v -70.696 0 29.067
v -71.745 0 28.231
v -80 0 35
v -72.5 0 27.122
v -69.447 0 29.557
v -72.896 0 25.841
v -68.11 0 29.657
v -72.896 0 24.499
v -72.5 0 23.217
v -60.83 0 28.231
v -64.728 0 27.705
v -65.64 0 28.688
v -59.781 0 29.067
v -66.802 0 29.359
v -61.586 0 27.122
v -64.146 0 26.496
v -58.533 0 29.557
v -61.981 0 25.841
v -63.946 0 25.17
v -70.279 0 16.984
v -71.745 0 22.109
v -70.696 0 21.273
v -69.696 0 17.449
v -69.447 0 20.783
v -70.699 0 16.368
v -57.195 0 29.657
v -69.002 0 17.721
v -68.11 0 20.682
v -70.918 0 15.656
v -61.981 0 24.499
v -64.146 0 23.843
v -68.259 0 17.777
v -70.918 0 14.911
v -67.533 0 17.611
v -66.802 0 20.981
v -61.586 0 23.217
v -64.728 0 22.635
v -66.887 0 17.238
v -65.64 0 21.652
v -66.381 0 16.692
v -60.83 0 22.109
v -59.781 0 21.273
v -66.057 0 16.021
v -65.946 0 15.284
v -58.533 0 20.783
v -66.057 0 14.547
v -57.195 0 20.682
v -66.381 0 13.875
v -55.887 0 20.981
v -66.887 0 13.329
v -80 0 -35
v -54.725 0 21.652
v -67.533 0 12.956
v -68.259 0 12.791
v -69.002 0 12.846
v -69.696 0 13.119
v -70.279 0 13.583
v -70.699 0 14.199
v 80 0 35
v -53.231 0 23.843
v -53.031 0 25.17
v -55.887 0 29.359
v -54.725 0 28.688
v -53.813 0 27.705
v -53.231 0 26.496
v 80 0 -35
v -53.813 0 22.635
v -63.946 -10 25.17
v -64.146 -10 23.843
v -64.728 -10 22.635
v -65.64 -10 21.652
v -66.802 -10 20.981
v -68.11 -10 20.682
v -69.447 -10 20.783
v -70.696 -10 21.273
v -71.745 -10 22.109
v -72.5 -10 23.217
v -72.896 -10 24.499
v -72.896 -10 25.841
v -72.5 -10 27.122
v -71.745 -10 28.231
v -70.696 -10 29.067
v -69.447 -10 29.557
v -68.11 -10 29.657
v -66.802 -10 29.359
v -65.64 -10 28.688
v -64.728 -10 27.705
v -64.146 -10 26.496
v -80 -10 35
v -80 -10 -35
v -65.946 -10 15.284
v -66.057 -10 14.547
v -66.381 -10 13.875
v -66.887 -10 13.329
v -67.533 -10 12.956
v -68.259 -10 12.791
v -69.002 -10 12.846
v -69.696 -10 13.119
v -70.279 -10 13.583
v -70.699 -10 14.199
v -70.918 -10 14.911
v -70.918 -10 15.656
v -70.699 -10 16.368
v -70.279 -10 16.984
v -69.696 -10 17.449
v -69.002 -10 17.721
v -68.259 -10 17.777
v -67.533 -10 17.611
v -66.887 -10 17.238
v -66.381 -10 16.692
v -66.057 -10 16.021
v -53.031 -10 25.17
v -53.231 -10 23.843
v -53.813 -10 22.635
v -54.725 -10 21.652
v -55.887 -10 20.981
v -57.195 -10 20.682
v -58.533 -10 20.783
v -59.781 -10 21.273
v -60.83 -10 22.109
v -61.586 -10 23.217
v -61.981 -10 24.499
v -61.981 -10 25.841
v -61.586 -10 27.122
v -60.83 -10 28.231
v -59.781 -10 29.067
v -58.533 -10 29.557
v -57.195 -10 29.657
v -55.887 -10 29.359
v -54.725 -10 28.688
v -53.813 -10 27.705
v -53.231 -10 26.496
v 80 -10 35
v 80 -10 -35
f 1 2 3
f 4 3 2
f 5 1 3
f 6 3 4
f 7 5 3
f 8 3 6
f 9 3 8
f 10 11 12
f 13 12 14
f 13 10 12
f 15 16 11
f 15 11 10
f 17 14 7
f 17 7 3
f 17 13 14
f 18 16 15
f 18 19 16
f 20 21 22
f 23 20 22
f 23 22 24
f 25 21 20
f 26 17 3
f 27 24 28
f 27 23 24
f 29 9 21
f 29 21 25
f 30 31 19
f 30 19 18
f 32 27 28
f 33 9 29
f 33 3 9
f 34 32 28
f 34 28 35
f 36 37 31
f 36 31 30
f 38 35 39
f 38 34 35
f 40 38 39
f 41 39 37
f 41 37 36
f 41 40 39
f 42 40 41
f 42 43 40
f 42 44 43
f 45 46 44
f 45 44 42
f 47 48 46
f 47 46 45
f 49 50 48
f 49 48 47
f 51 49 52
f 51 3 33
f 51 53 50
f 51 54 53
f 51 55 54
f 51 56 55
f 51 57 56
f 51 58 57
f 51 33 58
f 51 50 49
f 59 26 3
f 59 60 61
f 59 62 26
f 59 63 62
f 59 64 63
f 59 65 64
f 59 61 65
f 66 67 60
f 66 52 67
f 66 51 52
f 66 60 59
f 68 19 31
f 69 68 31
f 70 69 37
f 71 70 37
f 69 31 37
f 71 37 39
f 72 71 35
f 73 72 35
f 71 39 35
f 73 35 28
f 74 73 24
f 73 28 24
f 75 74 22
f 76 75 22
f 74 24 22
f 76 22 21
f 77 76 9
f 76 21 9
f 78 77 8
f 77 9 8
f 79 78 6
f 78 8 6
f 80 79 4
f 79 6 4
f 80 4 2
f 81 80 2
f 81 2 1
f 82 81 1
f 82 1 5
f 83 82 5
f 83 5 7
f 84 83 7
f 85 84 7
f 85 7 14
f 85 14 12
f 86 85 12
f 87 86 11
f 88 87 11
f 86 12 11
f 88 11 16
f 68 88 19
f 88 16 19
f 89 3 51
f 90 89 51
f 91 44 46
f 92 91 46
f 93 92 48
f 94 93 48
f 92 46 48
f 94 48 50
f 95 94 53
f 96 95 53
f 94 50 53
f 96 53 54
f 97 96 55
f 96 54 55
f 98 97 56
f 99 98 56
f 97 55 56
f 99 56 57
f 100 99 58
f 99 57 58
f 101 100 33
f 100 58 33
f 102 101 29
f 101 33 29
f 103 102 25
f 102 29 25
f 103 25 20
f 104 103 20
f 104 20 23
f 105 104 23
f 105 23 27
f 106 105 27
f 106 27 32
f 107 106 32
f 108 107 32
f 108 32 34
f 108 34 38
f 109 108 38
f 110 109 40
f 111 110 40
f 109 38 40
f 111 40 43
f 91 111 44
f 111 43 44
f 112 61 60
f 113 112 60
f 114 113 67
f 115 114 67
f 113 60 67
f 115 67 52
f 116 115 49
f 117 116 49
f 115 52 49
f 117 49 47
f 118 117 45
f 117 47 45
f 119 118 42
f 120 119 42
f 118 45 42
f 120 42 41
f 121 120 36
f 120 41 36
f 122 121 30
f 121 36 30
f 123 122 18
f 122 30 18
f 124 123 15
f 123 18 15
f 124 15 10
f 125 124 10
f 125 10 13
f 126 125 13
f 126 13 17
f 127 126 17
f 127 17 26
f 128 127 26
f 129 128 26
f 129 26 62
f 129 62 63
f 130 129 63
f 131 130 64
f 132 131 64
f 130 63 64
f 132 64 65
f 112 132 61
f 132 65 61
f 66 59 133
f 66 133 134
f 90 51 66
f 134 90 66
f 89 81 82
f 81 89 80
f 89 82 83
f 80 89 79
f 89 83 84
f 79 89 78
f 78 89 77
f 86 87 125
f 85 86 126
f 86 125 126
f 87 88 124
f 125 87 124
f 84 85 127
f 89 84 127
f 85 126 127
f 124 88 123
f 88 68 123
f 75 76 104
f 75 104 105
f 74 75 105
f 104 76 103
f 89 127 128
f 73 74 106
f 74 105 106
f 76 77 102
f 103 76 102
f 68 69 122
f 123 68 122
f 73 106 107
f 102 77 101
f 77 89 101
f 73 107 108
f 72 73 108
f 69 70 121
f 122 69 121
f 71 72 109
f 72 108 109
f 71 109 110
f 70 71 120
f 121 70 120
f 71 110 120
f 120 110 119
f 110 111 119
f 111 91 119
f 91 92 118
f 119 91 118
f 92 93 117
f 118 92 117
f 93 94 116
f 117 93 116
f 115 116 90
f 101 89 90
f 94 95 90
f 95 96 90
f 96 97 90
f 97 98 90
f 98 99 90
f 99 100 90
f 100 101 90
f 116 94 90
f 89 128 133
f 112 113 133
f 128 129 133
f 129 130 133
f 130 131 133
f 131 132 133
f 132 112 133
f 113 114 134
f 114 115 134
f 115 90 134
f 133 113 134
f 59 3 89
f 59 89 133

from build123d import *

# Parameters (mm, degrees)
SKETCH1_W           = 160
SKETCH1_H           = 70
SKETCH1_R           = 4.5
SKETCH1_R_2         = 2.5
BOSS_EXTRUDE1_DEPTH = 10


with BuildPart() as part:
    # Sketch1 → Boss-Extrude1 (new body)
    with BuildSketch(Plane(origin=(0, 0, 0), x_dir=(1, 0, 0), z_dir=(0, 1, 0))):
        Rectangle(SKETCH1_W, SKETCH1_H)
        with Locations((-68.446114543, -25.169889981)):
            Circle(SKETCH1_R, mode=Mode.SUBTRACT)
        with Locations((-68.446114543, -15.283664996)):
            Circle(SKETCH1_R_2, mode=Mode.SUBTRACT)
        with Locations((-57.5311771, -25.169889981)):
            Circle(SKETCH1_R, mode=Mode.SUBTRACT)
    extrude(amount=-BOSS_EXTRUDE1_DEPTH)


solid = part.part
